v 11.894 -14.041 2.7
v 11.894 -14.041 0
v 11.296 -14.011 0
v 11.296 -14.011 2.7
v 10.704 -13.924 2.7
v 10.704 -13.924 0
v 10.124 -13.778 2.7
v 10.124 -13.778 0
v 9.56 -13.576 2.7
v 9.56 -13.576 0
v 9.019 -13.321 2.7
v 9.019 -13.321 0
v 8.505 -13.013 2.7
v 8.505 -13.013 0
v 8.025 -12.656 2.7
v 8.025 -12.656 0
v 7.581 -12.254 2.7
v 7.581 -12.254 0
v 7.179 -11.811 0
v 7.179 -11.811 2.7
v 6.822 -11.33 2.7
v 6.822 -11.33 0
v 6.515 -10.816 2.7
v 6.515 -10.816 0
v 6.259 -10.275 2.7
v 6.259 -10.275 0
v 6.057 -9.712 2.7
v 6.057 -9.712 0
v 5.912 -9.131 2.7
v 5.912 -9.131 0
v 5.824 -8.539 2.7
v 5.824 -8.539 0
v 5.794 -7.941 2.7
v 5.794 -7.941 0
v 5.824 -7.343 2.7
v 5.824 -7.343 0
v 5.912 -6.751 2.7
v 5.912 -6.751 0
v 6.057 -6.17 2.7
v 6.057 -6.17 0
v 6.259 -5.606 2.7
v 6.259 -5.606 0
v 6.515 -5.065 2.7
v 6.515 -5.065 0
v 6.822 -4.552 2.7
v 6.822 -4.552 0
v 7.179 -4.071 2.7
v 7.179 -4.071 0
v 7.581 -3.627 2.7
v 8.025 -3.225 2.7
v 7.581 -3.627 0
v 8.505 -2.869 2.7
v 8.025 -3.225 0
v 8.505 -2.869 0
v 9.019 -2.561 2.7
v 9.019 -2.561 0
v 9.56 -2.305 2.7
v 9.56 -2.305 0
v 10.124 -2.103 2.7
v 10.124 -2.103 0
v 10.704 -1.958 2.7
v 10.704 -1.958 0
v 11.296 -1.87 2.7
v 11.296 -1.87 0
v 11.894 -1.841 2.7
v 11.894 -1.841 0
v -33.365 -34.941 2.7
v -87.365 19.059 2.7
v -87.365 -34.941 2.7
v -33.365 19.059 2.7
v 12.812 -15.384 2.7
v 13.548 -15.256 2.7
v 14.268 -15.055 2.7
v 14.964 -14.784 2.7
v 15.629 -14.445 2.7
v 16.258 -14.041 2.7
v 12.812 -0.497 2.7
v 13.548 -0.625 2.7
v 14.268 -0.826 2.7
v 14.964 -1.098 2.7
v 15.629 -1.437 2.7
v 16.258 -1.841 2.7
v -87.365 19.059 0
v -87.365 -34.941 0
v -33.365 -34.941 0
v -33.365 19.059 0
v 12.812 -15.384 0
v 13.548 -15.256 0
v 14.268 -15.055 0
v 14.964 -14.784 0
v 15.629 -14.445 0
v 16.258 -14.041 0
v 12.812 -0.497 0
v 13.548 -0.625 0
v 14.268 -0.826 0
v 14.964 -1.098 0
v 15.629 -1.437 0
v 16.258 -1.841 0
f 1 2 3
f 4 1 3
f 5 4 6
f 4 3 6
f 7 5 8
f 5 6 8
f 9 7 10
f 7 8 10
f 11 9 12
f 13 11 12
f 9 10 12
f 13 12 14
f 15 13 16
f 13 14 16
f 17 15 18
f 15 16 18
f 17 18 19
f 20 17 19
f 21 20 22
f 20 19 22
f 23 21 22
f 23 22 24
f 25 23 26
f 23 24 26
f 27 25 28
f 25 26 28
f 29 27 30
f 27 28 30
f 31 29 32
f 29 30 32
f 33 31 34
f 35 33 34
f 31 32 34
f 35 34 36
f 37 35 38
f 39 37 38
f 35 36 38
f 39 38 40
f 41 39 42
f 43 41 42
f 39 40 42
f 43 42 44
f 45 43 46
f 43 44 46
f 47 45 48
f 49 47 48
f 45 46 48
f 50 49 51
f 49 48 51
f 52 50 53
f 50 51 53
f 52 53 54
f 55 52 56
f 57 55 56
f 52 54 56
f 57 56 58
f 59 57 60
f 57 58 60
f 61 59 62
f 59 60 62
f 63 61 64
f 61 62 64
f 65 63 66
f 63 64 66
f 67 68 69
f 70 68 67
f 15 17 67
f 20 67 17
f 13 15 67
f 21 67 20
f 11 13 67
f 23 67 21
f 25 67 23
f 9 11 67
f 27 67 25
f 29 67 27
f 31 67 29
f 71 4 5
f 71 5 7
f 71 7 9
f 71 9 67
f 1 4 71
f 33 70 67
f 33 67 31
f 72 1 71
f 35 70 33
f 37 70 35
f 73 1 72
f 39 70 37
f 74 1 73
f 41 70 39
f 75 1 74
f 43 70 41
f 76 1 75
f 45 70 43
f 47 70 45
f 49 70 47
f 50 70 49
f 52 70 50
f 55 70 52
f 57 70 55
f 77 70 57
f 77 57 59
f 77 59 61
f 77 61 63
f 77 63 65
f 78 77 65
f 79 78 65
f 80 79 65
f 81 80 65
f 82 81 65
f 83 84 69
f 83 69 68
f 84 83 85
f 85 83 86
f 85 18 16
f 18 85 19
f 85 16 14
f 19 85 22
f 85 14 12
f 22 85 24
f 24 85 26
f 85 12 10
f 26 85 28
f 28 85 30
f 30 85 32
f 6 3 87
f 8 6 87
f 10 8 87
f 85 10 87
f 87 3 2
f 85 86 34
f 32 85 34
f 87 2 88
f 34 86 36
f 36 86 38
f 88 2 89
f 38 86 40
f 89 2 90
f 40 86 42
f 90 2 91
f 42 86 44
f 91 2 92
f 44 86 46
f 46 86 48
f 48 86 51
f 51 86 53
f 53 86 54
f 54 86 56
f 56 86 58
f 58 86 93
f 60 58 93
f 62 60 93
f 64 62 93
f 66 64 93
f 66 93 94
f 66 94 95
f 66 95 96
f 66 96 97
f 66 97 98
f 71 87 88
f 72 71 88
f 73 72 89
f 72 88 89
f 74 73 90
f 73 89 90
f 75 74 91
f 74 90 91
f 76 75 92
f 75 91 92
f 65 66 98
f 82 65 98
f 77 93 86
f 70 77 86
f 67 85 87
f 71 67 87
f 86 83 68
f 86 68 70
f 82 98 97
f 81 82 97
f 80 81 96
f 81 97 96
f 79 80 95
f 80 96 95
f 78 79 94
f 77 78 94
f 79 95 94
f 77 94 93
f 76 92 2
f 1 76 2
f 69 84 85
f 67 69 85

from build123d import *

# Parameters (mm, degrees)
F0_W     = 54
F0_H     = 54
F1_DEPTH = 2.7


# Not quite as in the source:
# - a feature names something its author has since deleted; it is built from what else it names


with BuildPart() as f1:
    # F0 (on Top) → F1 (new body)
    with BuildSketch(Plane.XY):
        with Locations((-60.3654519308, -7.9408198703)):
            Rectangle(F0_W, F0_H)
        with BuildLine():
            Line((-33.3654519308, -34.9408198703), (12.8123124507, -15.3844278592))
            ThreePointArc((12.8123124507, -15.3844278592), (14.6191753291, -14.9283225153), (16.2578103101, -14.0408198703))
            Line((16.2578103101, -14.0408198703), (11.8943254642, -14.0408198703))
            ThreePointArc((11.8943254642, -14.0408198703), (5.7943254642, -7.9408198703), (11.8943254642, -1.8408198703))
            Line((11.8943254642, -1.8408198703), (16.2578103101, -1.8408198703))
            ThreePointArc((16.2578103101, -1.8408198703), (14.6191753291, -0.9533172253), (12.8123124507, -0.4972118814))
            Line((12.8123124507, -0.4972118814), (-33.3654519308, 19.0591801297))
            Line((-33.3654519308, 19.0591801297), (-33.3654519308, -34.9408198703))
        make_face()
    extrude(amount=F1_DEPTH)


solid = f1.part
